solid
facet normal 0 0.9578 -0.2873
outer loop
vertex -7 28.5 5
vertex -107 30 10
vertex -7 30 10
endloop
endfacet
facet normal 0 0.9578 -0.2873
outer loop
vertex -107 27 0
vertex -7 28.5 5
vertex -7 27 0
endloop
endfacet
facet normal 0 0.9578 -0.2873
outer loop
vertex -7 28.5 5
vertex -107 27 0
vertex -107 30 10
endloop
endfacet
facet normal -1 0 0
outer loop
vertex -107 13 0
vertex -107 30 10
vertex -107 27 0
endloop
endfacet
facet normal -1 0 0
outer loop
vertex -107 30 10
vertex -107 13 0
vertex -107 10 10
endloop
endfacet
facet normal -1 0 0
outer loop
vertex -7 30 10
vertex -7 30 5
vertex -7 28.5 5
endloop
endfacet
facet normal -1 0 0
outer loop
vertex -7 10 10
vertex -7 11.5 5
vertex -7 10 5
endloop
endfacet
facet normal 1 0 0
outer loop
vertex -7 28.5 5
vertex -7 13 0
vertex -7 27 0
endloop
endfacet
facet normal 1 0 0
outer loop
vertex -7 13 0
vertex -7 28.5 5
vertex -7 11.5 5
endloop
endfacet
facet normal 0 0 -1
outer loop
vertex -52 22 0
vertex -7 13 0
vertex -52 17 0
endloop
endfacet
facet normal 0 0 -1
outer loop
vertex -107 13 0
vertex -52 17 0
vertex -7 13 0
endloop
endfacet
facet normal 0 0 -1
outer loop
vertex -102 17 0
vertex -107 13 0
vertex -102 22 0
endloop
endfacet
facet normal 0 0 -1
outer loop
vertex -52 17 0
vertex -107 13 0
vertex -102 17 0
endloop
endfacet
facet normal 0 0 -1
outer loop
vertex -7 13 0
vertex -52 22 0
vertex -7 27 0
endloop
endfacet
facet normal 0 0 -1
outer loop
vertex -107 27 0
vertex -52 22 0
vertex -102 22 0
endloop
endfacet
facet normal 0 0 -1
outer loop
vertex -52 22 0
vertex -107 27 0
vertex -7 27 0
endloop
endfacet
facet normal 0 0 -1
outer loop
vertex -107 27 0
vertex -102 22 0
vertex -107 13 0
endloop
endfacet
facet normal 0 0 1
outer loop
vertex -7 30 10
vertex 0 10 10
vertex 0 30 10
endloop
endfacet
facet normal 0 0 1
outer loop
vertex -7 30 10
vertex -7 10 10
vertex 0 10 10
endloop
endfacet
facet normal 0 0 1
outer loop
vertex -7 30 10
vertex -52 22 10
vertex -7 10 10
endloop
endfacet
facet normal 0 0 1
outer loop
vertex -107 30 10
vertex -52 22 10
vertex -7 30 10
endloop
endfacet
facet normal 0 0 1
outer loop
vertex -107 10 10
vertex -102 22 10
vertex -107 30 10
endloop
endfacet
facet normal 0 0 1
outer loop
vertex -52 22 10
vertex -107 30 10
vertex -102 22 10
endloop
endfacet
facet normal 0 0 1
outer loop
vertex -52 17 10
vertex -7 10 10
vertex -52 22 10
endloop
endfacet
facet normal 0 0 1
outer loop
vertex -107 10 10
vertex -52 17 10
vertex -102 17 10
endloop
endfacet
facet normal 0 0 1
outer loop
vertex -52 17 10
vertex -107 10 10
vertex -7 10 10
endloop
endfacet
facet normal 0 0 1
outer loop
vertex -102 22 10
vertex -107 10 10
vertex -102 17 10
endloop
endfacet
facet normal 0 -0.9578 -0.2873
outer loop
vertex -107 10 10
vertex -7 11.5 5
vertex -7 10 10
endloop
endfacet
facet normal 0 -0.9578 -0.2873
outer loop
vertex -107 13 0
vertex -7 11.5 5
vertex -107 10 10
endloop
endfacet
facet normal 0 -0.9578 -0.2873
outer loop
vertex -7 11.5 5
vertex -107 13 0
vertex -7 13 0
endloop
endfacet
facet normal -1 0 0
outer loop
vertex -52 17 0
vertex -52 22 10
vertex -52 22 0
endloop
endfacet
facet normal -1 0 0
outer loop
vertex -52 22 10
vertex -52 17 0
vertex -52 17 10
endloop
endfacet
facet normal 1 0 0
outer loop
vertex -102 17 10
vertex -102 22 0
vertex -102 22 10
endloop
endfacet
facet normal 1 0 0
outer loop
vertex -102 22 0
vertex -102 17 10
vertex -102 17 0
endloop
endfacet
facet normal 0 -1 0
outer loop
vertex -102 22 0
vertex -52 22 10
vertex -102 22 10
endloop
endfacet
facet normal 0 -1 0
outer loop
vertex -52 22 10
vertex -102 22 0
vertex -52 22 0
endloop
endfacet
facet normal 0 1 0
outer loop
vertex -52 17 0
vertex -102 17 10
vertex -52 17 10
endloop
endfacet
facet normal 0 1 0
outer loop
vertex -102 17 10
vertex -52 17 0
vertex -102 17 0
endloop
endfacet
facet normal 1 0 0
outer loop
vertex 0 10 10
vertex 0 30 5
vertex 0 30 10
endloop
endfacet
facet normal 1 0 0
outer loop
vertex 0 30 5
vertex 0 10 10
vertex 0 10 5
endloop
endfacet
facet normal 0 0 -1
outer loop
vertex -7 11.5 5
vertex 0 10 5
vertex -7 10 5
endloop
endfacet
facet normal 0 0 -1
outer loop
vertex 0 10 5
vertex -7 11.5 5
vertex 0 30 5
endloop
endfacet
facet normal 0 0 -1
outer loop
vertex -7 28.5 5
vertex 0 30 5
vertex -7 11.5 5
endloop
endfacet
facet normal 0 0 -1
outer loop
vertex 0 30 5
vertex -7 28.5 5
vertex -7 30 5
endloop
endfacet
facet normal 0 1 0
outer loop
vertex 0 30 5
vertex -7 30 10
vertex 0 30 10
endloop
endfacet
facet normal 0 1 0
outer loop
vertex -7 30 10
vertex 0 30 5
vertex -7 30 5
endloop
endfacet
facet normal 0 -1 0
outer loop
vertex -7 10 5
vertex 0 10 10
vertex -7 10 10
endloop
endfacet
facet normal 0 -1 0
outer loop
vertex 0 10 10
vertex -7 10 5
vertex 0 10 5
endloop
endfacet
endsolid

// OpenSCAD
//laser arm
paths = [[0,0],[3,10],[17,10],[20,0]];
translate([-7,5,0]){
	difference(){
		color("green") translate([-50,25,10]) rotate([90,180,90]){
			linear_extrude(height = 100, center = true, convexity = 14, twist = 0) 
			polygon(paths);
		}
		color("blue") translate([-95,12,-5]) cube([50,5,17]);
		*color("purple") translate([0,3,7.5])rotate([0,-86,0]) cube([5,25,40]);
	}
}
color("lime")translate([-7,10,5])cube([7,20,5]);
